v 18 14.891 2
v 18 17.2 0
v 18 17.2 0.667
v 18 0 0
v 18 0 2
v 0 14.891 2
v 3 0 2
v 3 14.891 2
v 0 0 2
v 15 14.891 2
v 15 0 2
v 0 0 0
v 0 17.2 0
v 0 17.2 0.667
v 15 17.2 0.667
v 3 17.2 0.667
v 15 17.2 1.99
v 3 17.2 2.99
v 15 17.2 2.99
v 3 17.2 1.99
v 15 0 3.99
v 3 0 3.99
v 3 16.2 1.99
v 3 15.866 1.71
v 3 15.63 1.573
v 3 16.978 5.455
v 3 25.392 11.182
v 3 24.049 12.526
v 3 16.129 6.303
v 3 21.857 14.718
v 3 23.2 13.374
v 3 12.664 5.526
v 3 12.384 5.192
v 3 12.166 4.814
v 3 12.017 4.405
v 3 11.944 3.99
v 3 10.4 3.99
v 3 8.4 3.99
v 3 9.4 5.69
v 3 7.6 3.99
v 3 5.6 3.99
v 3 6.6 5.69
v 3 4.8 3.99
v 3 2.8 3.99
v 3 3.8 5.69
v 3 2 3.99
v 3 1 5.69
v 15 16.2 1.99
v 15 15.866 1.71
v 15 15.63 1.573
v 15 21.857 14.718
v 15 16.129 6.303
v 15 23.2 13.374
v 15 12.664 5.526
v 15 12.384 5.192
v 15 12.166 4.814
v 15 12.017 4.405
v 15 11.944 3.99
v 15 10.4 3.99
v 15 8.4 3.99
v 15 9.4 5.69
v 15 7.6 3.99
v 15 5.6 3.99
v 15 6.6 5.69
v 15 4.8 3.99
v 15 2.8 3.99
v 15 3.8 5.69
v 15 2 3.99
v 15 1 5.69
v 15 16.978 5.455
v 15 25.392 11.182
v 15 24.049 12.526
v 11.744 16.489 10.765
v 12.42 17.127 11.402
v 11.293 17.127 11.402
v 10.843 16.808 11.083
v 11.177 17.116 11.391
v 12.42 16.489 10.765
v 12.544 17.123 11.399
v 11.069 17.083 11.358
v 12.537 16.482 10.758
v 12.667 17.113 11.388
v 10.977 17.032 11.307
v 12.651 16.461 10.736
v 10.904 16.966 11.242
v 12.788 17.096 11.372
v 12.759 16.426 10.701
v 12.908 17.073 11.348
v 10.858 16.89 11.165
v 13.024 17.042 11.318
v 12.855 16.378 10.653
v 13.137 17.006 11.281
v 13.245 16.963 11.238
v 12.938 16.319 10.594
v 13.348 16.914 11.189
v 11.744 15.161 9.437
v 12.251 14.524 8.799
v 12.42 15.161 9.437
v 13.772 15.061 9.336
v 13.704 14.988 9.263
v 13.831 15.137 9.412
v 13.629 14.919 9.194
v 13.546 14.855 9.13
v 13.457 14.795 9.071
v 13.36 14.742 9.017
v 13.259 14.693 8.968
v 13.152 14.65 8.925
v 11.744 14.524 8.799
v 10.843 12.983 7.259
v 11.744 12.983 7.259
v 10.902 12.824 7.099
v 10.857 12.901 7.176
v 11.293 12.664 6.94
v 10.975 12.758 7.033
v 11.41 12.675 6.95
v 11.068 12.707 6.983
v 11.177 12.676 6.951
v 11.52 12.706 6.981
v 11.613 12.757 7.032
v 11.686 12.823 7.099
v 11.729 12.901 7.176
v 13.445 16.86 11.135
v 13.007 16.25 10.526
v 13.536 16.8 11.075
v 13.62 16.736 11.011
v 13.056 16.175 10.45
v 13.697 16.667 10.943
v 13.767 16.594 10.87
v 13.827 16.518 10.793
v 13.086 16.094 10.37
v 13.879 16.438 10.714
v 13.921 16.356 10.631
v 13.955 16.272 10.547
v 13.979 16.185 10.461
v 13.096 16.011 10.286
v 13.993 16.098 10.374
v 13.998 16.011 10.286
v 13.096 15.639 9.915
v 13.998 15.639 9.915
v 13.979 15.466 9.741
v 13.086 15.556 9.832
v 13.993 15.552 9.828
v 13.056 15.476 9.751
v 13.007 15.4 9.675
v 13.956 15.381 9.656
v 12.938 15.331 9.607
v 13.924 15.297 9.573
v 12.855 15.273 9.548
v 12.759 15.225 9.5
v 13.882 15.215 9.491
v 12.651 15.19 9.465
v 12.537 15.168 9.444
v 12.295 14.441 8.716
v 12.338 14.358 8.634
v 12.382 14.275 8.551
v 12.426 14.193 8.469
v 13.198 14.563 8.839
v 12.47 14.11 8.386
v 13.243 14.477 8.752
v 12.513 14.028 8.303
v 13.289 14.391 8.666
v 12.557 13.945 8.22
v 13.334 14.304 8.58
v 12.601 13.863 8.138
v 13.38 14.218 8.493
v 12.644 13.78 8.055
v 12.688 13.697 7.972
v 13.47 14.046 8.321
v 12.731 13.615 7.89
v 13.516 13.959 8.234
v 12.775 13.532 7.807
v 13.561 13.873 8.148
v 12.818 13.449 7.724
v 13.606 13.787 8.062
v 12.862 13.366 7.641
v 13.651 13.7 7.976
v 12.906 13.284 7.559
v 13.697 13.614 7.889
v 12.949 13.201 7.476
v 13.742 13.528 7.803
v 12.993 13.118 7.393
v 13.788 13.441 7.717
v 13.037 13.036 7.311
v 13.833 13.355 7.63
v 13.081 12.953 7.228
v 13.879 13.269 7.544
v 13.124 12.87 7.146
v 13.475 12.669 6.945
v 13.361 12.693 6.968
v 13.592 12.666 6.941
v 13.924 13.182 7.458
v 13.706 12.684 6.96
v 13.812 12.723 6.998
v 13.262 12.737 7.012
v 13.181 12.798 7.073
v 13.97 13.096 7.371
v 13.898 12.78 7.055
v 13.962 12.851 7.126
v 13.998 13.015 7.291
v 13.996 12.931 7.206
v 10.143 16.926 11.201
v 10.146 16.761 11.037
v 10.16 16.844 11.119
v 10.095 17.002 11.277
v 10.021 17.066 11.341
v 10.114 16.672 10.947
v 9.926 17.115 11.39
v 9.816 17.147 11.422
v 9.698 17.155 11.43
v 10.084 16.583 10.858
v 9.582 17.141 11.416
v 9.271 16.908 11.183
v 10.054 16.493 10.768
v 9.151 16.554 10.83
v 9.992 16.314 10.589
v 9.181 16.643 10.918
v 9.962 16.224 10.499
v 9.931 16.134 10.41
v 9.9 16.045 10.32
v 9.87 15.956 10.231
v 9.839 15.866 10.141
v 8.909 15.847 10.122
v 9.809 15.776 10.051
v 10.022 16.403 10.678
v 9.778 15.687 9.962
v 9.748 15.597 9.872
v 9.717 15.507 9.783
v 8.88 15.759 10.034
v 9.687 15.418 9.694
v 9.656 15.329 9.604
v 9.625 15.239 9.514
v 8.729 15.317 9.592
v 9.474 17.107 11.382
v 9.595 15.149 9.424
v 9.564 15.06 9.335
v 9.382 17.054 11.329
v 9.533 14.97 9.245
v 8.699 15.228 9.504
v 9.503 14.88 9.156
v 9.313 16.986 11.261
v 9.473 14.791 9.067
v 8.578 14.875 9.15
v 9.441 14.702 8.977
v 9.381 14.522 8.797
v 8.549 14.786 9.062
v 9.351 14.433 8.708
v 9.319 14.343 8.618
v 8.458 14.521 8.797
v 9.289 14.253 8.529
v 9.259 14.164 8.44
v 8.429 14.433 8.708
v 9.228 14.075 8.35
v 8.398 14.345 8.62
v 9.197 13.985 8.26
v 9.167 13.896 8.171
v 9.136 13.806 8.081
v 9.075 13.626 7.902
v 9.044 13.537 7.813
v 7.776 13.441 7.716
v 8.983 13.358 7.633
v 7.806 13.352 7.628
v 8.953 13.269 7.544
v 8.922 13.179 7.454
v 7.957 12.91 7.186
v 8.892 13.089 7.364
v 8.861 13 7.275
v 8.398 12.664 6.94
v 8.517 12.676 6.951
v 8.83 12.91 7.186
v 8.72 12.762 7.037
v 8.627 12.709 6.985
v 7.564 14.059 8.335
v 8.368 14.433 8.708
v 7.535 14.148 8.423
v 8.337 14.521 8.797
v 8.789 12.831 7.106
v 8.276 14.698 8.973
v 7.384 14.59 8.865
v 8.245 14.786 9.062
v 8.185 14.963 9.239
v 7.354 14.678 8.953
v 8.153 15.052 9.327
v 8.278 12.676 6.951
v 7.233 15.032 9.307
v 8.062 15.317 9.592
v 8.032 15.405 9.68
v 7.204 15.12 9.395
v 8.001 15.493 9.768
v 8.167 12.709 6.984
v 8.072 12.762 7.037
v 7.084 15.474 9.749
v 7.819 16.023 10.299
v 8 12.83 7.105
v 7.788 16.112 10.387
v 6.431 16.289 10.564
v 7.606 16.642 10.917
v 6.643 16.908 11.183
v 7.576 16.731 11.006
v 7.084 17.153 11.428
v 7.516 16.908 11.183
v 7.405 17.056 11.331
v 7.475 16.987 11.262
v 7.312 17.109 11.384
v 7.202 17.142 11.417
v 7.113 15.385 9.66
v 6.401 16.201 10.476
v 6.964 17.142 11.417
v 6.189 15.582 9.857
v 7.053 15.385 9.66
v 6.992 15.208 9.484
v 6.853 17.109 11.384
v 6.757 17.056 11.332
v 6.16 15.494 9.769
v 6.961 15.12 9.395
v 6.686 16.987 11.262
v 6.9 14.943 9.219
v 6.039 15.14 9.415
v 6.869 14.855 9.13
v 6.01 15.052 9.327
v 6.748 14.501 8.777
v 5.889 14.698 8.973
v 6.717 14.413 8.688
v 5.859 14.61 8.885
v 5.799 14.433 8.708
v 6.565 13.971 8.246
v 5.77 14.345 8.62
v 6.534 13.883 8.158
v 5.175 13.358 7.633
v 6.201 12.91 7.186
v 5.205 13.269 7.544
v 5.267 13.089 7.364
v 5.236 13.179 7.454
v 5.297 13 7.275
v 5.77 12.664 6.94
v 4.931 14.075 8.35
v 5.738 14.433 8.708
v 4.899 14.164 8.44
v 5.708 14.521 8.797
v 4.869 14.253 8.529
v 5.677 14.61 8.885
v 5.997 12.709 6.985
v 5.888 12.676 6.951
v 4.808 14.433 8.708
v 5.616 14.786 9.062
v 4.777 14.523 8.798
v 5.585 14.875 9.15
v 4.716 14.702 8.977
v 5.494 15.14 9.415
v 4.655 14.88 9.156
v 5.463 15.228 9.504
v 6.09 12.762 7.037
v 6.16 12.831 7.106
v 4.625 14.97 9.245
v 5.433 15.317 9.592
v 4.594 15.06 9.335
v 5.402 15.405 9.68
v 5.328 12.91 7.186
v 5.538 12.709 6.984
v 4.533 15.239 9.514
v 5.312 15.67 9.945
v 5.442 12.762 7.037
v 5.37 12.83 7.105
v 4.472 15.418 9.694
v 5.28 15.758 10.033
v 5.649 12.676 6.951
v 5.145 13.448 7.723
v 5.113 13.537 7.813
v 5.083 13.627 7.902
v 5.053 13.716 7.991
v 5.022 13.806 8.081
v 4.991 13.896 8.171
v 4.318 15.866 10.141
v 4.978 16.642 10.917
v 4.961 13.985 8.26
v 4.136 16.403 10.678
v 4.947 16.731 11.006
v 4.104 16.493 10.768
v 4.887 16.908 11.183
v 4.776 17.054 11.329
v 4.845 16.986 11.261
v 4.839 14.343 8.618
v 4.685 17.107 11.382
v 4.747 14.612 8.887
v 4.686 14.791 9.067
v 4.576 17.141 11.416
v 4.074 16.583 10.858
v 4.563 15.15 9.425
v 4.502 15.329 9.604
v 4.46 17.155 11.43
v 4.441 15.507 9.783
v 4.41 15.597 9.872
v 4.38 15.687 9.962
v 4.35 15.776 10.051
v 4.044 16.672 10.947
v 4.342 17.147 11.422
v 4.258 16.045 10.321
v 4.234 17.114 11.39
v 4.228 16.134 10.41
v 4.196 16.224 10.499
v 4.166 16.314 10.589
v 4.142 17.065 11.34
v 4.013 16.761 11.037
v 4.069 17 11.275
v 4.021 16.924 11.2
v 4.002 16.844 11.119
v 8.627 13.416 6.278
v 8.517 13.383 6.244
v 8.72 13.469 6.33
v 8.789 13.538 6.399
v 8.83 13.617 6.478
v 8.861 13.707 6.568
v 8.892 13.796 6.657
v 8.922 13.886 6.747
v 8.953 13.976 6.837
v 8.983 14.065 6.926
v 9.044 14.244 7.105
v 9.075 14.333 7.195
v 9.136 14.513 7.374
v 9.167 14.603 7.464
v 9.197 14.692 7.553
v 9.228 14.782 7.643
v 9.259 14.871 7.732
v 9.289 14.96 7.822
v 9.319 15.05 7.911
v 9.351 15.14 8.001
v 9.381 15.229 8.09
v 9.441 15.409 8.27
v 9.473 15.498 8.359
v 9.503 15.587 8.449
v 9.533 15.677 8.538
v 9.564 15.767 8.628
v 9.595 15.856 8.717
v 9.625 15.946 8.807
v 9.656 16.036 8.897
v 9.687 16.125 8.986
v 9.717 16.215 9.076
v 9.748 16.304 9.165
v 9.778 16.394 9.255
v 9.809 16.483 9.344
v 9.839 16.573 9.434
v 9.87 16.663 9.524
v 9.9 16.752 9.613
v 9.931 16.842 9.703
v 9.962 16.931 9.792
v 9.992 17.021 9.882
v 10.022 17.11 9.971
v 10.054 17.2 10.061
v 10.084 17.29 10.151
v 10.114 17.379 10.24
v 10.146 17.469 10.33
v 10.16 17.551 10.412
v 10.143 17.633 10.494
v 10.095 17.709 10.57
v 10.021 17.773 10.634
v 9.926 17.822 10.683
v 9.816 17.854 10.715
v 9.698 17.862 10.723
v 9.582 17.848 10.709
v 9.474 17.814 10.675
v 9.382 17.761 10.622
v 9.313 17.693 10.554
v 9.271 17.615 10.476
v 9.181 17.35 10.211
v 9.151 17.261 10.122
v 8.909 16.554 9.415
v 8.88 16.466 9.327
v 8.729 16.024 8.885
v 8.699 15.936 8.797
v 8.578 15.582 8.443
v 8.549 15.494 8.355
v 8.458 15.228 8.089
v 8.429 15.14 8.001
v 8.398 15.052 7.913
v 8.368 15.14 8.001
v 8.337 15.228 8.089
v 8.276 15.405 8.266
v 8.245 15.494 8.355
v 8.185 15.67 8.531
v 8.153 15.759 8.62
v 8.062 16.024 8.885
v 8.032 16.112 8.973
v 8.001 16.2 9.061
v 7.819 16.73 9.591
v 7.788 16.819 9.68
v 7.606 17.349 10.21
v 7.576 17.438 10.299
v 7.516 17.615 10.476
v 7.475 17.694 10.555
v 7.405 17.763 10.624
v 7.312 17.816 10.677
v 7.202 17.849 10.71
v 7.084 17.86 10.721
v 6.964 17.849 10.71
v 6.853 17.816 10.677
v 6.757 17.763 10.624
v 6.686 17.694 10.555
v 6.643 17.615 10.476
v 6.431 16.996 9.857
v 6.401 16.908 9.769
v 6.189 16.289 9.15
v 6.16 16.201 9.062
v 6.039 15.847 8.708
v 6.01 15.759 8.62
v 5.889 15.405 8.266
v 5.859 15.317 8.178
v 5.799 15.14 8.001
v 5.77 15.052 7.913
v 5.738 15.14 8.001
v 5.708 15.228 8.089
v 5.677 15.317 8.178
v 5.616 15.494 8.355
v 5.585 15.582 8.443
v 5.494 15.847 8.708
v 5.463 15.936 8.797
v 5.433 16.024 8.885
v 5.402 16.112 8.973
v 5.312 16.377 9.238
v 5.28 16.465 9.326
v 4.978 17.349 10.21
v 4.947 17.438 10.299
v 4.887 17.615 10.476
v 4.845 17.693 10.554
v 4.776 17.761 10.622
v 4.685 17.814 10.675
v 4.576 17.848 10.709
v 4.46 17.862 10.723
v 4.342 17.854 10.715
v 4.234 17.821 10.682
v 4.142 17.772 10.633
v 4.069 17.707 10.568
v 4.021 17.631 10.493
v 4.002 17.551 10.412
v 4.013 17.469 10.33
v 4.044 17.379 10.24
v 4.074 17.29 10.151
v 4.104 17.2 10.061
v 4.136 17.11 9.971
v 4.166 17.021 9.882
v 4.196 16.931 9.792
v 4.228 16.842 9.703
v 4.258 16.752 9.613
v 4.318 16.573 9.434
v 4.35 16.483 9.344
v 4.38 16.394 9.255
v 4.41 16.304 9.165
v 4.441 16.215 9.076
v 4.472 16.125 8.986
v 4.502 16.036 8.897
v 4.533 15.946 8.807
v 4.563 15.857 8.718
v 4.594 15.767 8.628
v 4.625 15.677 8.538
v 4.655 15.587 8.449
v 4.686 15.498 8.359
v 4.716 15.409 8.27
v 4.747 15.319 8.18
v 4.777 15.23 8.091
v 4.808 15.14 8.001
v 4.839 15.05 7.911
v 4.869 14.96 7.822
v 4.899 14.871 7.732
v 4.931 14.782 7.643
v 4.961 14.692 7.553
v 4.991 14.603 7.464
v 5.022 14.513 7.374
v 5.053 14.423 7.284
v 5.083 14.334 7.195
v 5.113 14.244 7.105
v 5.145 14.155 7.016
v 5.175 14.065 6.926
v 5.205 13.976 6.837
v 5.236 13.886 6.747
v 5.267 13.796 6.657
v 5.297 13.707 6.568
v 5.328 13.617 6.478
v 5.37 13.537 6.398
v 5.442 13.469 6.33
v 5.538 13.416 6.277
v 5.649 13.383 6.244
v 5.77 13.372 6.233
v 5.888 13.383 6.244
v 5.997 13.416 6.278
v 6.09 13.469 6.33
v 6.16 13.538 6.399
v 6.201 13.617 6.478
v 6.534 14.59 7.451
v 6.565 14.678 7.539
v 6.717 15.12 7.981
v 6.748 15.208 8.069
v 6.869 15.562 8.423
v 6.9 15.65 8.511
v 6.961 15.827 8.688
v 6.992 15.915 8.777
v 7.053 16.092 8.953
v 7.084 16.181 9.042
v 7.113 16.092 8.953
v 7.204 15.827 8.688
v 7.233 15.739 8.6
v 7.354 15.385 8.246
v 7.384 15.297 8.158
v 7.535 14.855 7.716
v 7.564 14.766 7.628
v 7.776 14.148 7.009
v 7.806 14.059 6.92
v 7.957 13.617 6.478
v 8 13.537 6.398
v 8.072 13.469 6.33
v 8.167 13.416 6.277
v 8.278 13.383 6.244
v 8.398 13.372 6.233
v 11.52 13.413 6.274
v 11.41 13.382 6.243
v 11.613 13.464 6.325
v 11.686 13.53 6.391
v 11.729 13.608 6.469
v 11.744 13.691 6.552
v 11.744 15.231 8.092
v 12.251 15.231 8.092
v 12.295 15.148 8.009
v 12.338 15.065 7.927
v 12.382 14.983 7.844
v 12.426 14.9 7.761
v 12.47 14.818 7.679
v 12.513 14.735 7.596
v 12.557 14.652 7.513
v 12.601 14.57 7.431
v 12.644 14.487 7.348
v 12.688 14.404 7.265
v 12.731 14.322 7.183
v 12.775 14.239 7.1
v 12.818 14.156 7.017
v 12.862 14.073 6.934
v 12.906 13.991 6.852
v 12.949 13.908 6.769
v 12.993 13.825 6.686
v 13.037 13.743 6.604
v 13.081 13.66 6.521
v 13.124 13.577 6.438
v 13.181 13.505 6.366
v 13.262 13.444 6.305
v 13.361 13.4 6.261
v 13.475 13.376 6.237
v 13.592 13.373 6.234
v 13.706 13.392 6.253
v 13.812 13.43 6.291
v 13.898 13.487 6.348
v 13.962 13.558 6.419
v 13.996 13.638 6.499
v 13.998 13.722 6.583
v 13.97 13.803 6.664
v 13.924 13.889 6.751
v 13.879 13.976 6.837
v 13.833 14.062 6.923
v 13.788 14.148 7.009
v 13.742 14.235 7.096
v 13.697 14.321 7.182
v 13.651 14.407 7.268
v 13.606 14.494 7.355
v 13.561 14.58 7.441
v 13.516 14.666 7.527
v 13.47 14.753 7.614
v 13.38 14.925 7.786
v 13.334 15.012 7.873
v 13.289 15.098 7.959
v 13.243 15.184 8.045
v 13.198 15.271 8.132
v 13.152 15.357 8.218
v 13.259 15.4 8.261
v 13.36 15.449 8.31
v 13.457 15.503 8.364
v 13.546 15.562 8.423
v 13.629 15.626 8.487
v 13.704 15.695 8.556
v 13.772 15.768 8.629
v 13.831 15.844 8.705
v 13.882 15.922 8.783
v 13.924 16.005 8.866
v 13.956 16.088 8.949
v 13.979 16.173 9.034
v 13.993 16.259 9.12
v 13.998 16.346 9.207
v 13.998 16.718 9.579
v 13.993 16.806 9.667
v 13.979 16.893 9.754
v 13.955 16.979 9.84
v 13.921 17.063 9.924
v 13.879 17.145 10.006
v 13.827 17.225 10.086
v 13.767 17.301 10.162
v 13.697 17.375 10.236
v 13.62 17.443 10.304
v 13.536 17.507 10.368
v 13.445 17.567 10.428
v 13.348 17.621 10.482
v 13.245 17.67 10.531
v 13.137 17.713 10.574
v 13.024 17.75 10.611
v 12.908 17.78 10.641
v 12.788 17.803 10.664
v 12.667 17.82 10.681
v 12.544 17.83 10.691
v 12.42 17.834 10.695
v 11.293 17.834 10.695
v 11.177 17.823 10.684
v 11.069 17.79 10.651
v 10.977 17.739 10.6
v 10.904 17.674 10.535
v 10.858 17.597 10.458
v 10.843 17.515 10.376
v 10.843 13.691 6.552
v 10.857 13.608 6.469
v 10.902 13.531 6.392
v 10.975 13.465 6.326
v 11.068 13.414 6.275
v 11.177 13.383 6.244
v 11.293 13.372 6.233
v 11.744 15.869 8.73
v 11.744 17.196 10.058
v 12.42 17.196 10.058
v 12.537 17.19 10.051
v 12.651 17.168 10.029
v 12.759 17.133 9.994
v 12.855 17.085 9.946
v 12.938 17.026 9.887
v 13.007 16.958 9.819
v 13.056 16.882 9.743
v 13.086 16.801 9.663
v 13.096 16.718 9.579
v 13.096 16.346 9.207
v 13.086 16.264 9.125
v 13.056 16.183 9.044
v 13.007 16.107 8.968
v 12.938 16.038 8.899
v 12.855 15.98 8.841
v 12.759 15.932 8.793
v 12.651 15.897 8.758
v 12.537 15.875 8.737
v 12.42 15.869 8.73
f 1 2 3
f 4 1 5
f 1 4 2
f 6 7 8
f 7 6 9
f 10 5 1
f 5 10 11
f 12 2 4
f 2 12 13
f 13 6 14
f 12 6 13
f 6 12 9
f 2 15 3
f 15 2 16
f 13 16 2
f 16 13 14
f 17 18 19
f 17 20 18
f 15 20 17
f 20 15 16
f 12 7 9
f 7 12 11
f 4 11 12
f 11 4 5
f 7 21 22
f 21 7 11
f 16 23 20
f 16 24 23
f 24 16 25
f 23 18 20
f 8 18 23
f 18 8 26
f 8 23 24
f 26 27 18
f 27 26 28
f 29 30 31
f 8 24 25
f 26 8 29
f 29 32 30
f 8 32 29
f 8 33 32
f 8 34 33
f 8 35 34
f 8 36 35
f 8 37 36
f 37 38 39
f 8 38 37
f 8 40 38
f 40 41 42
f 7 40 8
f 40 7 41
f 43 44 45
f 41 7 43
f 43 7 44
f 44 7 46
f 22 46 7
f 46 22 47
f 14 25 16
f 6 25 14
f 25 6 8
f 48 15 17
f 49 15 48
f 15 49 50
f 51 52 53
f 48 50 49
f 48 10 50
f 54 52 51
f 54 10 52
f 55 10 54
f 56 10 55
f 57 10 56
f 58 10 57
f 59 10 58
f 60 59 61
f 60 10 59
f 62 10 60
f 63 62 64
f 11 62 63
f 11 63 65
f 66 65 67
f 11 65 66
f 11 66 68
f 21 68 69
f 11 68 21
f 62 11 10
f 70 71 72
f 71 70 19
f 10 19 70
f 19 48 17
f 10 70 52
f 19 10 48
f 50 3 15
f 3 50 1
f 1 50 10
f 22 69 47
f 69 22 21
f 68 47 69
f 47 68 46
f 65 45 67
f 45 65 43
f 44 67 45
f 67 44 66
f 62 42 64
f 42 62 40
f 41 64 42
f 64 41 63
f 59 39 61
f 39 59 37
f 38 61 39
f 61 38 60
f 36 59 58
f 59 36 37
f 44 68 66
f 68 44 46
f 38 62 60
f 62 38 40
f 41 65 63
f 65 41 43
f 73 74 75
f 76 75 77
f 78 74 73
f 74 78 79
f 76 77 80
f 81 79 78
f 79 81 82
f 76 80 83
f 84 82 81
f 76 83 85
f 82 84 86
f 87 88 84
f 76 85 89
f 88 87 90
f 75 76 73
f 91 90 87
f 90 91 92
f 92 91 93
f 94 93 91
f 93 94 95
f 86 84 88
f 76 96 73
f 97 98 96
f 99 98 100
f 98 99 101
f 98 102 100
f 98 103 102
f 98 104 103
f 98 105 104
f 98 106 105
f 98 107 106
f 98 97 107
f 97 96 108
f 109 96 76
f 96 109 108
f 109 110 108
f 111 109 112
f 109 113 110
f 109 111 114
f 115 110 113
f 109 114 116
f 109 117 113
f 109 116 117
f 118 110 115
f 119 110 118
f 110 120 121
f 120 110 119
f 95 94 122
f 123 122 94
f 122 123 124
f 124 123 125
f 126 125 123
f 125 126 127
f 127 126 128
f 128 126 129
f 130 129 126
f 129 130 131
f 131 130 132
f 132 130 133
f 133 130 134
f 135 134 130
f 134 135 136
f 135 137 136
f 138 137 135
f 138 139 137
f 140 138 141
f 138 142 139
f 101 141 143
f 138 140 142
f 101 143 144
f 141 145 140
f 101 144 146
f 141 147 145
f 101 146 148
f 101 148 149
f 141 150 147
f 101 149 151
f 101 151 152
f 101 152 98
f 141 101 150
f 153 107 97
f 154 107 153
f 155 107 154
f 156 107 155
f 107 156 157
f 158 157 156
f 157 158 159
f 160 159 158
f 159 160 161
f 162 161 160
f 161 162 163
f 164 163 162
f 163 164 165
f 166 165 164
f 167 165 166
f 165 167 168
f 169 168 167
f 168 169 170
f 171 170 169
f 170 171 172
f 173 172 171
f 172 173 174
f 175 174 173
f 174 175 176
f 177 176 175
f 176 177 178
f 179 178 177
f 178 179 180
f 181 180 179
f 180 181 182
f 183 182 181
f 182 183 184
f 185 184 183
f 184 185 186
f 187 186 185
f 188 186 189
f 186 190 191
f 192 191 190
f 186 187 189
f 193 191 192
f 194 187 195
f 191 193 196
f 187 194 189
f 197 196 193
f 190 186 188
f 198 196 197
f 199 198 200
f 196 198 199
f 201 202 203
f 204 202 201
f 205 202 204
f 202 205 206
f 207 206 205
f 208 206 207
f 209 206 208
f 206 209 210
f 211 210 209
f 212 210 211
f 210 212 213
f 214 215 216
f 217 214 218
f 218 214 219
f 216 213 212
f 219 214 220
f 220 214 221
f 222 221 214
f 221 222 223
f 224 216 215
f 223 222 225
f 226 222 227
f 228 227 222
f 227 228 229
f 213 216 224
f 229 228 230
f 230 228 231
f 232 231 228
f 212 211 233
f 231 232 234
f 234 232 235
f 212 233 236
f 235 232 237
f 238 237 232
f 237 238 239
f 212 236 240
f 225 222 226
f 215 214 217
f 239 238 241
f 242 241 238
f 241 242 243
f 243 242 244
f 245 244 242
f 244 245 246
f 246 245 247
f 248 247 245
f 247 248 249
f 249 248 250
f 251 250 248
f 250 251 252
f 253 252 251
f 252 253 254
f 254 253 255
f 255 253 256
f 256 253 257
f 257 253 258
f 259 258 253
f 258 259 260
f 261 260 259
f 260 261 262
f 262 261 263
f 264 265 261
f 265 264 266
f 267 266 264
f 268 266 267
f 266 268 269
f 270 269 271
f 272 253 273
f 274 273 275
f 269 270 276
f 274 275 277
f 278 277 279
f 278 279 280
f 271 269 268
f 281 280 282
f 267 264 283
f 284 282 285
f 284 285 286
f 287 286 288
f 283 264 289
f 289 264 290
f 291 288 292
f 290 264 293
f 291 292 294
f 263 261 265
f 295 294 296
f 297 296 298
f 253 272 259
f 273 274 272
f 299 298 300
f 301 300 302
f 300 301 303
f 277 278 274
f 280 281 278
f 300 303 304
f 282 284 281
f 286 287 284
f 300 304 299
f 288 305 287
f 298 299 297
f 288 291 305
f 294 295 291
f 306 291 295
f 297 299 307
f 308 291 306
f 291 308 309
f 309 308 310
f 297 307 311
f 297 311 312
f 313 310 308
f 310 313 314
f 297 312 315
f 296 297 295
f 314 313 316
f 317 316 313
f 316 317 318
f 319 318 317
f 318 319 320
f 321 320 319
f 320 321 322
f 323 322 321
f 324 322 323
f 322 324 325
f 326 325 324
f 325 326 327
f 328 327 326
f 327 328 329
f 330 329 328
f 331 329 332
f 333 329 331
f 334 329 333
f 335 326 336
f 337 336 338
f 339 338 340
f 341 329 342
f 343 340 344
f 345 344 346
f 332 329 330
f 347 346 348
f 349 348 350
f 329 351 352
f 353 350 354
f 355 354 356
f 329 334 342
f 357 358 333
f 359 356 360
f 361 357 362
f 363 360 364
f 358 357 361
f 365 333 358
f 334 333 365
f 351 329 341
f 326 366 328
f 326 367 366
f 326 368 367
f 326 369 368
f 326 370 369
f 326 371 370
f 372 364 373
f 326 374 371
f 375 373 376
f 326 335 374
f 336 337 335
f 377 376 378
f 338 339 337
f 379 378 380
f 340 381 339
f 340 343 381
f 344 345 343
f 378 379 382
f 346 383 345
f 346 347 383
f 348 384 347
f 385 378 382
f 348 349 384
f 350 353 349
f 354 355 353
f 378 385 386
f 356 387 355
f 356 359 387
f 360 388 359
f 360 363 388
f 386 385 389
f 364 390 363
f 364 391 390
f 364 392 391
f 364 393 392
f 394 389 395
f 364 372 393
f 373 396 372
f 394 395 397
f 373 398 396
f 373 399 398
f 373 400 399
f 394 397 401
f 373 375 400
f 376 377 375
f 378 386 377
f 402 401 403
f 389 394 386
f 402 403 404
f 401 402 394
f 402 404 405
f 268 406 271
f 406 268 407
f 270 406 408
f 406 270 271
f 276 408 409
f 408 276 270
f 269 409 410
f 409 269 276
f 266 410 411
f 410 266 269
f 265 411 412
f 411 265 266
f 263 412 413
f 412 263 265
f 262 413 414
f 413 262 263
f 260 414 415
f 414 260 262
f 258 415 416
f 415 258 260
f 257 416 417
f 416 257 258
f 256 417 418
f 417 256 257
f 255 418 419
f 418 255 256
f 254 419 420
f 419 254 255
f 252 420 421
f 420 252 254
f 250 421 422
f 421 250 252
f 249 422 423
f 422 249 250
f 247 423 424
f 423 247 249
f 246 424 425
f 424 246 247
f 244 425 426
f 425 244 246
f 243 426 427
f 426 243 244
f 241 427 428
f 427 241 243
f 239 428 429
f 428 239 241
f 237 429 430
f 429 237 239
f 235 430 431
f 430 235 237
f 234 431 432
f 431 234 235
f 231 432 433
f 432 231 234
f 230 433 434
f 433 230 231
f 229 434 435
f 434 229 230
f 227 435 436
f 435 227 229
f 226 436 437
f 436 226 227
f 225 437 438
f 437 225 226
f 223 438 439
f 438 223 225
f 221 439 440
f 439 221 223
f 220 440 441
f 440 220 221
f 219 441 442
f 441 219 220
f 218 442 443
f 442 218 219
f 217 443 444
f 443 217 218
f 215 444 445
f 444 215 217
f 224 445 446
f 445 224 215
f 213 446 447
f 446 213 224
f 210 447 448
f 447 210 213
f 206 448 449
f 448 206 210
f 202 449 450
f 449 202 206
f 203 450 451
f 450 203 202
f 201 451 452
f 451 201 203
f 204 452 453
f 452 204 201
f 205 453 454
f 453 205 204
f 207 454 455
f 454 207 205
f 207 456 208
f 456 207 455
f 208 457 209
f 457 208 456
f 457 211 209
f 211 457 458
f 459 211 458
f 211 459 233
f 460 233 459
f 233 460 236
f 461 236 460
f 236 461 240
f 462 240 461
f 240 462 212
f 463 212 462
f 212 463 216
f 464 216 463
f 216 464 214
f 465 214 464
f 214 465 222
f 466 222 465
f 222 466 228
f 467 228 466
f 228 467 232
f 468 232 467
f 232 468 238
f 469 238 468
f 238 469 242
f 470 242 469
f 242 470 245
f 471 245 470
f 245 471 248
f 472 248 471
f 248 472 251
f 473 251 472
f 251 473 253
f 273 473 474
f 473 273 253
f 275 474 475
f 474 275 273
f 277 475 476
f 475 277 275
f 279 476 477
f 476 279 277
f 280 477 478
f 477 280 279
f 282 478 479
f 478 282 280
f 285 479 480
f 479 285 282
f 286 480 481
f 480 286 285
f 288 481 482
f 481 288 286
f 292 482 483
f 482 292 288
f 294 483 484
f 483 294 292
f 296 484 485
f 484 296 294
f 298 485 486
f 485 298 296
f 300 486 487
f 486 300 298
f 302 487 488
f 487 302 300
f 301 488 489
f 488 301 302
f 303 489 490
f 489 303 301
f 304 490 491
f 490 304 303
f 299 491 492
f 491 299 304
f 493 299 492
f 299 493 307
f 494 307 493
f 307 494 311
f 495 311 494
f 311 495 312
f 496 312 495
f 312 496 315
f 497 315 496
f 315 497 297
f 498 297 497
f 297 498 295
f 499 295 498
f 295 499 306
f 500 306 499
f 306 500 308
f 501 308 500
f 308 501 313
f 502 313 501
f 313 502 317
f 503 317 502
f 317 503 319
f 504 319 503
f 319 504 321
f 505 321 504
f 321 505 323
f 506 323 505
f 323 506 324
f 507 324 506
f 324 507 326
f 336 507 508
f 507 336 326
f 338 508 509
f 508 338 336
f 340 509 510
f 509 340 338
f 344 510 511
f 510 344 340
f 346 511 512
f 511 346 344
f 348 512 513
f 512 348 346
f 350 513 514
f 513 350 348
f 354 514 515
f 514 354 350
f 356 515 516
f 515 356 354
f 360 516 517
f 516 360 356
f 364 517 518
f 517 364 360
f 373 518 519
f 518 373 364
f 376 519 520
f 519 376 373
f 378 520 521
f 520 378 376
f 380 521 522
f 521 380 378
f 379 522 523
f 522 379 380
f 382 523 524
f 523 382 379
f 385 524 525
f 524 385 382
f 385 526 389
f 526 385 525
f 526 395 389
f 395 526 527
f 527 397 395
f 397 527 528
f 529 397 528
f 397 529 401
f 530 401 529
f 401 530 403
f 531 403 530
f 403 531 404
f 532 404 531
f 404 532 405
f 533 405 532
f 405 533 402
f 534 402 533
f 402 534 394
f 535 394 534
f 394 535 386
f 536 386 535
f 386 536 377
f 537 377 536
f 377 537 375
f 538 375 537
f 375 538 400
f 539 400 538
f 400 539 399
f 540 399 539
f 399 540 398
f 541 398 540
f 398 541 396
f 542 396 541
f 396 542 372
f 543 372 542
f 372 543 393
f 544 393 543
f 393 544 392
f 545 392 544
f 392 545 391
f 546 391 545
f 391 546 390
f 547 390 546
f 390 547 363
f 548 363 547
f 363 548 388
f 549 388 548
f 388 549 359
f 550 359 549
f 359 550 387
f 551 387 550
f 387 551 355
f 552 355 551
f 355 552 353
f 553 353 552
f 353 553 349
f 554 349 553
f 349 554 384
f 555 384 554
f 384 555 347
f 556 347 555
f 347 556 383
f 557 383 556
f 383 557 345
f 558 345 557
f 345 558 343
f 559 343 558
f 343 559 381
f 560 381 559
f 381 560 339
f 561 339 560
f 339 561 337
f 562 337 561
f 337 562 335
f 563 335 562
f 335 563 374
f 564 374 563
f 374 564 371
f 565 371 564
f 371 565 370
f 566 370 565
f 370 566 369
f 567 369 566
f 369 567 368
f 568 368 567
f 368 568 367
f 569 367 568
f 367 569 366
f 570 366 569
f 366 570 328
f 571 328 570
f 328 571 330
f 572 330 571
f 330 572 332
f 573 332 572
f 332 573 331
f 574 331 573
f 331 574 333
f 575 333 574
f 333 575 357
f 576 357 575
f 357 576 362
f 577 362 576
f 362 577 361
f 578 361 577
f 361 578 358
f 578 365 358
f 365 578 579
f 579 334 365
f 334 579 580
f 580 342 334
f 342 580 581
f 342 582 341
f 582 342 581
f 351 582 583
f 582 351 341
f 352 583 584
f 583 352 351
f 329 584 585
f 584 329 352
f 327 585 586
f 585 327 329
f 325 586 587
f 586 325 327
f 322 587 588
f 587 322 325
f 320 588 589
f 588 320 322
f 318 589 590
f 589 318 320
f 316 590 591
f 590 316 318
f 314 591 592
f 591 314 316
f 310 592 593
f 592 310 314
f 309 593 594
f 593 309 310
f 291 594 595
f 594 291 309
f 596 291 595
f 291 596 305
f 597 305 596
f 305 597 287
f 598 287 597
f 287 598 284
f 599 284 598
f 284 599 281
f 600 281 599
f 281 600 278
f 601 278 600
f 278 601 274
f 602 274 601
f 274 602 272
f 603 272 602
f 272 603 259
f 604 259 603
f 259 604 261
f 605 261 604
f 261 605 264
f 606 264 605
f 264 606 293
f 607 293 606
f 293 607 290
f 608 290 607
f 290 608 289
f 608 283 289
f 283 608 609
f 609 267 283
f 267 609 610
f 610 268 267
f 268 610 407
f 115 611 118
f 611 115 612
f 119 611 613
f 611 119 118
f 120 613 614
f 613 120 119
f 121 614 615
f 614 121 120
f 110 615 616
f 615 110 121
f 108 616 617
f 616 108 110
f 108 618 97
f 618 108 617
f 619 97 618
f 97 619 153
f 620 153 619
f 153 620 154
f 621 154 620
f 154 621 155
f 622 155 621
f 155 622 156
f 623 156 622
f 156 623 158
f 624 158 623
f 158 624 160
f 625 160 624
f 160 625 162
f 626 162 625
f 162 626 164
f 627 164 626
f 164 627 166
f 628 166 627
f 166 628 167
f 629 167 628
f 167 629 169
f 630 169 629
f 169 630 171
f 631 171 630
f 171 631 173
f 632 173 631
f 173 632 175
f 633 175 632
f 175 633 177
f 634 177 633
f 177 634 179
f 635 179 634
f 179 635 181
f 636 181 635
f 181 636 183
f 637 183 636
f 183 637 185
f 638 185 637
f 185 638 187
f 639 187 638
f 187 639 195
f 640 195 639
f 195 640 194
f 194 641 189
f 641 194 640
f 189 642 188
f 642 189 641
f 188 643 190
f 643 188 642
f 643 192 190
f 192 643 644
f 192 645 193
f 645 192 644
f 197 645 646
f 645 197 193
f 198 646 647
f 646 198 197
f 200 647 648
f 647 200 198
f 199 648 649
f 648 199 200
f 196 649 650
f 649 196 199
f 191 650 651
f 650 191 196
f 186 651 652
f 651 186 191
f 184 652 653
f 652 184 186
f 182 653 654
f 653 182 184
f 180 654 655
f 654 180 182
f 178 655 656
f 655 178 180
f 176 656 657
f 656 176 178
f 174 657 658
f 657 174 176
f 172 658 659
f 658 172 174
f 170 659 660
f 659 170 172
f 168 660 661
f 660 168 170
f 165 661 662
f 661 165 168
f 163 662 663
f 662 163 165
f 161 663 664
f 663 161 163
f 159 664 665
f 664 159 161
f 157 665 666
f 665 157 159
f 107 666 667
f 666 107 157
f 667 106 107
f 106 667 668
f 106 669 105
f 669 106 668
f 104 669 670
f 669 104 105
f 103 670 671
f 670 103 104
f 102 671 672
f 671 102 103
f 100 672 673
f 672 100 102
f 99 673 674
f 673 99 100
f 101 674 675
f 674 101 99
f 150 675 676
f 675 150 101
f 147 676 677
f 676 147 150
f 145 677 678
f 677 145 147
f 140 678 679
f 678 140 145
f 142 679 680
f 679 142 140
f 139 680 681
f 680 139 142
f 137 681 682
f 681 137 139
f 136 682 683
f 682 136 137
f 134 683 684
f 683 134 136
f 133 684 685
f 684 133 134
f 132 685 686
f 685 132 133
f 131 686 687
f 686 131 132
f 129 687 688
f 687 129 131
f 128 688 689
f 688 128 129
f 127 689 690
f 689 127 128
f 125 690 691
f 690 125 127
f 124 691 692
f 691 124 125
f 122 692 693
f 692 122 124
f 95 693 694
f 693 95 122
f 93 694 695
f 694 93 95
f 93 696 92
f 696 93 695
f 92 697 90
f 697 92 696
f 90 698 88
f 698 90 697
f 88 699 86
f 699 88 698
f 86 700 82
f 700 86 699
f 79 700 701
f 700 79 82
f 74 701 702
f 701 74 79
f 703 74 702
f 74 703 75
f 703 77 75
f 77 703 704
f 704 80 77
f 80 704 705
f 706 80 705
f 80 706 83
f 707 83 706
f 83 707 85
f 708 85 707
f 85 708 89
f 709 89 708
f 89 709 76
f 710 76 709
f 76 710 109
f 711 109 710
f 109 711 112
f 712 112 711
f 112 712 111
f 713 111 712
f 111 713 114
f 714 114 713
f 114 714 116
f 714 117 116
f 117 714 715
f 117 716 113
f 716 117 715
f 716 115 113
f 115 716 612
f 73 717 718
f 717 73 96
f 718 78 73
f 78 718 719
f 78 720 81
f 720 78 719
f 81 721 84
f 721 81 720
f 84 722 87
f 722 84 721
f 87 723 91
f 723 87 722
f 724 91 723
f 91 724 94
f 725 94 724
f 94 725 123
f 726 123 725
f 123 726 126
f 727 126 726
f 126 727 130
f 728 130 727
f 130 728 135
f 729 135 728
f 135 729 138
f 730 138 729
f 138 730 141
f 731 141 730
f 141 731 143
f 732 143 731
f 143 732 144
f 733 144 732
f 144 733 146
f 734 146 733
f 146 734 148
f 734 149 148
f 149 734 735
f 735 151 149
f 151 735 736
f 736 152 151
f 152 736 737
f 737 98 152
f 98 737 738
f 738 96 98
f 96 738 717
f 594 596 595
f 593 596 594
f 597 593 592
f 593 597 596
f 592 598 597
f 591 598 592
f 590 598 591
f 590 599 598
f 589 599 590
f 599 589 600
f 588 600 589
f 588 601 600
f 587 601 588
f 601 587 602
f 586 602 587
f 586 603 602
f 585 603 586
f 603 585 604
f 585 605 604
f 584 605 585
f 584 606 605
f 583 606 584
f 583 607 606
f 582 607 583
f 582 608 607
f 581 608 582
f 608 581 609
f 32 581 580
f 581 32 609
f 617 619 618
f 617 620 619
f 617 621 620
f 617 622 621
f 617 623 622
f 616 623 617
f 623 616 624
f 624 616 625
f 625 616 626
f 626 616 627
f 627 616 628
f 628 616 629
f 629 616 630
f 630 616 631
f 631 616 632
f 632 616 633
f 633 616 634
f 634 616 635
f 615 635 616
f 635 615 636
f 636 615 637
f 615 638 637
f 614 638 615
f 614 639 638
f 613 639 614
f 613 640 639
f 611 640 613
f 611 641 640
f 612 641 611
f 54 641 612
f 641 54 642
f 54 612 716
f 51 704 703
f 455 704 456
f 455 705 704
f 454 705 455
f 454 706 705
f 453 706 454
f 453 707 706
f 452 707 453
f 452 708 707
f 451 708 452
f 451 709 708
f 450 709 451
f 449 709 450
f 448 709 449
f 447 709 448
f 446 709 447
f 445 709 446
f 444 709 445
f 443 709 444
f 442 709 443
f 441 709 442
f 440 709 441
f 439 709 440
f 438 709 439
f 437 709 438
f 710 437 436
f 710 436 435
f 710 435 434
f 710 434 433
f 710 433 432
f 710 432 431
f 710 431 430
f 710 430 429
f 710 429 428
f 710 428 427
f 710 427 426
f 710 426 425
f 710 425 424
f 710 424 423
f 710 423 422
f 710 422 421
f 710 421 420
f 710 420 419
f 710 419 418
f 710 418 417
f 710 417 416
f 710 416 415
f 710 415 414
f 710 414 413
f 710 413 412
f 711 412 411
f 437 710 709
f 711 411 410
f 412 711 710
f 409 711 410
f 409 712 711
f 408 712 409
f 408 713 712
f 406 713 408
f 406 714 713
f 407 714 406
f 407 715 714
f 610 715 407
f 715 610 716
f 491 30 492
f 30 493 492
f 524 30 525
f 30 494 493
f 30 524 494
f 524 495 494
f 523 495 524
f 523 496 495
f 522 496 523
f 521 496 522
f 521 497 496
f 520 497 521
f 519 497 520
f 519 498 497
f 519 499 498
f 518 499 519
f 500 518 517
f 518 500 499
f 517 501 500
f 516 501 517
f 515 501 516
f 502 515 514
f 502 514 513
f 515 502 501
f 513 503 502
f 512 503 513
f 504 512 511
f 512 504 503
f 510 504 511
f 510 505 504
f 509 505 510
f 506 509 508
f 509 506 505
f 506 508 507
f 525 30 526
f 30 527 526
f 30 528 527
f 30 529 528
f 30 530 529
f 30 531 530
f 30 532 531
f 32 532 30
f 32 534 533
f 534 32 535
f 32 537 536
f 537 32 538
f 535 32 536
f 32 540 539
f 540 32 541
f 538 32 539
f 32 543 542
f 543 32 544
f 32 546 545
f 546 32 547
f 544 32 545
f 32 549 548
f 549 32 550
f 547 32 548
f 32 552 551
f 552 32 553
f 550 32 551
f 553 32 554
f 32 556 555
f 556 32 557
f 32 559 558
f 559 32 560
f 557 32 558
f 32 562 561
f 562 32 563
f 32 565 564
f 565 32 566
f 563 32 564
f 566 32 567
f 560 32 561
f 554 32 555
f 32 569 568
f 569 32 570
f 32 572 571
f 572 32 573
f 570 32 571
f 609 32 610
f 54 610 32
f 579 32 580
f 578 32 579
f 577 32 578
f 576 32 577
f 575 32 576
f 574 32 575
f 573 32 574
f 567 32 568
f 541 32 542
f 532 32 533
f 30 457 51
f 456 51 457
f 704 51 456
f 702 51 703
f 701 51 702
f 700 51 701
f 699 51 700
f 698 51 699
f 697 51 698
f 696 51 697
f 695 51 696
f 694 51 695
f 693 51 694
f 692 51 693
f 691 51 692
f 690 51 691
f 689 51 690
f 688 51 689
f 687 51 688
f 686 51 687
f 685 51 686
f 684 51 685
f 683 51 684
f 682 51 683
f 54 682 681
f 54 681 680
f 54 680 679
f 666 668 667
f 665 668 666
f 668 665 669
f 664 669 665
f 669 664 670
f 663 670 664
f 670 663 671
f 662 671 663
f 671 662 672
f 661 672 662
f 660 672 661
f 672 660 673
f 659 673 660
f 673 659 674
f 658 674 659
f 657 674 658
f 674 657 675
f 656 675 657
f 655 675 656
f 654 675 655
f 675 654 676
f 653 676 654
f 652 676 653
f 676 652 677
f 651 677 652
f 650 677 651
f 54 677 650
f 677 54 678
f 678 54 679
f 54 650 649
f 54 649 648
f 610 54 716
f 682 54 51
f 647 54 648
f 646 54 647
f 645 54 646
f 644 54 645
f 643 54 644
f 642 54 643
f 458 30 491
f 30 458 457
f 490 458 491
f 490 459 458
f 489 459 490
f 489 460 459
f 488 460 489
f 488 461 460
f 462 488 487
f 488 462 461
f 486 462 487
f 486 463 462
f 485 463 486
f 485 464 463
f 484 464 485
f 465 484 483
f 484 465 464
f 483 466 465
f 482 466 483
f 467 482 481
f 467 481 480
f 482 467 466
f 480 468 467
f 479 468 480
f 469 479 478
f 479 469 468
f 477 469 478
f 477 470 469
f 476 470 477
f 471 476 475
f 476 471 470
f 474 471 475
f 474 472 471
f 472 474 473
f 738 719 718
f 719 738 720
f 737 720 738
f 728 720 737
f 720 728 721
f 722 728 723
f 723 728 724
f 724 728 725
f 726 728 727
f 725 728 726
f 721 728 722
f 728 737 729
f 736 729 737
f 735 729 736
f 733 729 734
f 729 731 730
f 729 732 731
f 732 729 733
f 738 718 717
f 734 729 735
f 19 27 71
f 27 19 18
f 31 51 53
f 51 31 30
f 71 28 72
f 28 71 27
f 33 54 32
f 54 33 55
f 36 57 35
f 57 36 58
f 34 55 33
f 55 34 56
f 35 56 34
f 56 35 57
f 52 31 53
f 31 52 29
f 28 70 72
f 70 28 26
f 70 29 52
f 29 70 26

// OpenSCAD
hs_w      = 18.0;
hs_l      = 17.2;
hs_h      = 2;
hs2_w     = 12;
hs2_l     = hs_l;
hs2_h     = 2;
hs2_x_off = (hs_w-hs2_w)/2;
hs3_l     = 13;
hs3_h     = 5;
hs3_w     = 1.2;

module hotshoe() {
    union() {
        difference() {
            cube([hs_w, hs_l, hs_h]);
            translate([-1,hs_l,hs_h/3]) rotate([60,0,0]) cube([hs2_x_off+1, 10,10]);
            translate([hs2_x_off+hs2_w,hs_l,hs_h/3]) rotate([60,0,0]) cube([hs2_x_off+1, 10,10]);
        }
        translate([hs2_x_off, 0, hs_h-0.01]) {
            cube([hs2_w, hs2_l, hs2_h]);
            for ( i = [0:3]) 
                //translate([0,1+i*1.8,hs2_h]) rotate([0,90,0]) rotate([0,0,30]) cylinder(h=hs2_w, $fn=3);
                #translate([hs2_w/2,1+2.8*(i),hs2_h]) scale([1,1,1.7]) rotate([45,0,0]) cube([hs2_w,sqrt(2), sqrt(2)], center=true);
        }
        translate([hs2_x_off, hs2_l-1, hs_h-0.01])
        rotate([45,0,0])
        difference() {
            union() {
                translate([1,1,hs3_h-1]) linear_extrude(height=1+1) import(file="WR.dxf", layer="initials");
                cube([hs2_w, hs3_l, hs3_h]);
                translate([0,0,hs3_h/2]) rotate([0,90,0]) cylinder(h=hs2_w, r=hs3_h/2, $fn=36);
            }
            translate([-1,3,(hs3_h-hs3_w)/2]) cube([hs2_w+2, hs3_l, hs3_w]);
        }
    }
}

hotshoe();
